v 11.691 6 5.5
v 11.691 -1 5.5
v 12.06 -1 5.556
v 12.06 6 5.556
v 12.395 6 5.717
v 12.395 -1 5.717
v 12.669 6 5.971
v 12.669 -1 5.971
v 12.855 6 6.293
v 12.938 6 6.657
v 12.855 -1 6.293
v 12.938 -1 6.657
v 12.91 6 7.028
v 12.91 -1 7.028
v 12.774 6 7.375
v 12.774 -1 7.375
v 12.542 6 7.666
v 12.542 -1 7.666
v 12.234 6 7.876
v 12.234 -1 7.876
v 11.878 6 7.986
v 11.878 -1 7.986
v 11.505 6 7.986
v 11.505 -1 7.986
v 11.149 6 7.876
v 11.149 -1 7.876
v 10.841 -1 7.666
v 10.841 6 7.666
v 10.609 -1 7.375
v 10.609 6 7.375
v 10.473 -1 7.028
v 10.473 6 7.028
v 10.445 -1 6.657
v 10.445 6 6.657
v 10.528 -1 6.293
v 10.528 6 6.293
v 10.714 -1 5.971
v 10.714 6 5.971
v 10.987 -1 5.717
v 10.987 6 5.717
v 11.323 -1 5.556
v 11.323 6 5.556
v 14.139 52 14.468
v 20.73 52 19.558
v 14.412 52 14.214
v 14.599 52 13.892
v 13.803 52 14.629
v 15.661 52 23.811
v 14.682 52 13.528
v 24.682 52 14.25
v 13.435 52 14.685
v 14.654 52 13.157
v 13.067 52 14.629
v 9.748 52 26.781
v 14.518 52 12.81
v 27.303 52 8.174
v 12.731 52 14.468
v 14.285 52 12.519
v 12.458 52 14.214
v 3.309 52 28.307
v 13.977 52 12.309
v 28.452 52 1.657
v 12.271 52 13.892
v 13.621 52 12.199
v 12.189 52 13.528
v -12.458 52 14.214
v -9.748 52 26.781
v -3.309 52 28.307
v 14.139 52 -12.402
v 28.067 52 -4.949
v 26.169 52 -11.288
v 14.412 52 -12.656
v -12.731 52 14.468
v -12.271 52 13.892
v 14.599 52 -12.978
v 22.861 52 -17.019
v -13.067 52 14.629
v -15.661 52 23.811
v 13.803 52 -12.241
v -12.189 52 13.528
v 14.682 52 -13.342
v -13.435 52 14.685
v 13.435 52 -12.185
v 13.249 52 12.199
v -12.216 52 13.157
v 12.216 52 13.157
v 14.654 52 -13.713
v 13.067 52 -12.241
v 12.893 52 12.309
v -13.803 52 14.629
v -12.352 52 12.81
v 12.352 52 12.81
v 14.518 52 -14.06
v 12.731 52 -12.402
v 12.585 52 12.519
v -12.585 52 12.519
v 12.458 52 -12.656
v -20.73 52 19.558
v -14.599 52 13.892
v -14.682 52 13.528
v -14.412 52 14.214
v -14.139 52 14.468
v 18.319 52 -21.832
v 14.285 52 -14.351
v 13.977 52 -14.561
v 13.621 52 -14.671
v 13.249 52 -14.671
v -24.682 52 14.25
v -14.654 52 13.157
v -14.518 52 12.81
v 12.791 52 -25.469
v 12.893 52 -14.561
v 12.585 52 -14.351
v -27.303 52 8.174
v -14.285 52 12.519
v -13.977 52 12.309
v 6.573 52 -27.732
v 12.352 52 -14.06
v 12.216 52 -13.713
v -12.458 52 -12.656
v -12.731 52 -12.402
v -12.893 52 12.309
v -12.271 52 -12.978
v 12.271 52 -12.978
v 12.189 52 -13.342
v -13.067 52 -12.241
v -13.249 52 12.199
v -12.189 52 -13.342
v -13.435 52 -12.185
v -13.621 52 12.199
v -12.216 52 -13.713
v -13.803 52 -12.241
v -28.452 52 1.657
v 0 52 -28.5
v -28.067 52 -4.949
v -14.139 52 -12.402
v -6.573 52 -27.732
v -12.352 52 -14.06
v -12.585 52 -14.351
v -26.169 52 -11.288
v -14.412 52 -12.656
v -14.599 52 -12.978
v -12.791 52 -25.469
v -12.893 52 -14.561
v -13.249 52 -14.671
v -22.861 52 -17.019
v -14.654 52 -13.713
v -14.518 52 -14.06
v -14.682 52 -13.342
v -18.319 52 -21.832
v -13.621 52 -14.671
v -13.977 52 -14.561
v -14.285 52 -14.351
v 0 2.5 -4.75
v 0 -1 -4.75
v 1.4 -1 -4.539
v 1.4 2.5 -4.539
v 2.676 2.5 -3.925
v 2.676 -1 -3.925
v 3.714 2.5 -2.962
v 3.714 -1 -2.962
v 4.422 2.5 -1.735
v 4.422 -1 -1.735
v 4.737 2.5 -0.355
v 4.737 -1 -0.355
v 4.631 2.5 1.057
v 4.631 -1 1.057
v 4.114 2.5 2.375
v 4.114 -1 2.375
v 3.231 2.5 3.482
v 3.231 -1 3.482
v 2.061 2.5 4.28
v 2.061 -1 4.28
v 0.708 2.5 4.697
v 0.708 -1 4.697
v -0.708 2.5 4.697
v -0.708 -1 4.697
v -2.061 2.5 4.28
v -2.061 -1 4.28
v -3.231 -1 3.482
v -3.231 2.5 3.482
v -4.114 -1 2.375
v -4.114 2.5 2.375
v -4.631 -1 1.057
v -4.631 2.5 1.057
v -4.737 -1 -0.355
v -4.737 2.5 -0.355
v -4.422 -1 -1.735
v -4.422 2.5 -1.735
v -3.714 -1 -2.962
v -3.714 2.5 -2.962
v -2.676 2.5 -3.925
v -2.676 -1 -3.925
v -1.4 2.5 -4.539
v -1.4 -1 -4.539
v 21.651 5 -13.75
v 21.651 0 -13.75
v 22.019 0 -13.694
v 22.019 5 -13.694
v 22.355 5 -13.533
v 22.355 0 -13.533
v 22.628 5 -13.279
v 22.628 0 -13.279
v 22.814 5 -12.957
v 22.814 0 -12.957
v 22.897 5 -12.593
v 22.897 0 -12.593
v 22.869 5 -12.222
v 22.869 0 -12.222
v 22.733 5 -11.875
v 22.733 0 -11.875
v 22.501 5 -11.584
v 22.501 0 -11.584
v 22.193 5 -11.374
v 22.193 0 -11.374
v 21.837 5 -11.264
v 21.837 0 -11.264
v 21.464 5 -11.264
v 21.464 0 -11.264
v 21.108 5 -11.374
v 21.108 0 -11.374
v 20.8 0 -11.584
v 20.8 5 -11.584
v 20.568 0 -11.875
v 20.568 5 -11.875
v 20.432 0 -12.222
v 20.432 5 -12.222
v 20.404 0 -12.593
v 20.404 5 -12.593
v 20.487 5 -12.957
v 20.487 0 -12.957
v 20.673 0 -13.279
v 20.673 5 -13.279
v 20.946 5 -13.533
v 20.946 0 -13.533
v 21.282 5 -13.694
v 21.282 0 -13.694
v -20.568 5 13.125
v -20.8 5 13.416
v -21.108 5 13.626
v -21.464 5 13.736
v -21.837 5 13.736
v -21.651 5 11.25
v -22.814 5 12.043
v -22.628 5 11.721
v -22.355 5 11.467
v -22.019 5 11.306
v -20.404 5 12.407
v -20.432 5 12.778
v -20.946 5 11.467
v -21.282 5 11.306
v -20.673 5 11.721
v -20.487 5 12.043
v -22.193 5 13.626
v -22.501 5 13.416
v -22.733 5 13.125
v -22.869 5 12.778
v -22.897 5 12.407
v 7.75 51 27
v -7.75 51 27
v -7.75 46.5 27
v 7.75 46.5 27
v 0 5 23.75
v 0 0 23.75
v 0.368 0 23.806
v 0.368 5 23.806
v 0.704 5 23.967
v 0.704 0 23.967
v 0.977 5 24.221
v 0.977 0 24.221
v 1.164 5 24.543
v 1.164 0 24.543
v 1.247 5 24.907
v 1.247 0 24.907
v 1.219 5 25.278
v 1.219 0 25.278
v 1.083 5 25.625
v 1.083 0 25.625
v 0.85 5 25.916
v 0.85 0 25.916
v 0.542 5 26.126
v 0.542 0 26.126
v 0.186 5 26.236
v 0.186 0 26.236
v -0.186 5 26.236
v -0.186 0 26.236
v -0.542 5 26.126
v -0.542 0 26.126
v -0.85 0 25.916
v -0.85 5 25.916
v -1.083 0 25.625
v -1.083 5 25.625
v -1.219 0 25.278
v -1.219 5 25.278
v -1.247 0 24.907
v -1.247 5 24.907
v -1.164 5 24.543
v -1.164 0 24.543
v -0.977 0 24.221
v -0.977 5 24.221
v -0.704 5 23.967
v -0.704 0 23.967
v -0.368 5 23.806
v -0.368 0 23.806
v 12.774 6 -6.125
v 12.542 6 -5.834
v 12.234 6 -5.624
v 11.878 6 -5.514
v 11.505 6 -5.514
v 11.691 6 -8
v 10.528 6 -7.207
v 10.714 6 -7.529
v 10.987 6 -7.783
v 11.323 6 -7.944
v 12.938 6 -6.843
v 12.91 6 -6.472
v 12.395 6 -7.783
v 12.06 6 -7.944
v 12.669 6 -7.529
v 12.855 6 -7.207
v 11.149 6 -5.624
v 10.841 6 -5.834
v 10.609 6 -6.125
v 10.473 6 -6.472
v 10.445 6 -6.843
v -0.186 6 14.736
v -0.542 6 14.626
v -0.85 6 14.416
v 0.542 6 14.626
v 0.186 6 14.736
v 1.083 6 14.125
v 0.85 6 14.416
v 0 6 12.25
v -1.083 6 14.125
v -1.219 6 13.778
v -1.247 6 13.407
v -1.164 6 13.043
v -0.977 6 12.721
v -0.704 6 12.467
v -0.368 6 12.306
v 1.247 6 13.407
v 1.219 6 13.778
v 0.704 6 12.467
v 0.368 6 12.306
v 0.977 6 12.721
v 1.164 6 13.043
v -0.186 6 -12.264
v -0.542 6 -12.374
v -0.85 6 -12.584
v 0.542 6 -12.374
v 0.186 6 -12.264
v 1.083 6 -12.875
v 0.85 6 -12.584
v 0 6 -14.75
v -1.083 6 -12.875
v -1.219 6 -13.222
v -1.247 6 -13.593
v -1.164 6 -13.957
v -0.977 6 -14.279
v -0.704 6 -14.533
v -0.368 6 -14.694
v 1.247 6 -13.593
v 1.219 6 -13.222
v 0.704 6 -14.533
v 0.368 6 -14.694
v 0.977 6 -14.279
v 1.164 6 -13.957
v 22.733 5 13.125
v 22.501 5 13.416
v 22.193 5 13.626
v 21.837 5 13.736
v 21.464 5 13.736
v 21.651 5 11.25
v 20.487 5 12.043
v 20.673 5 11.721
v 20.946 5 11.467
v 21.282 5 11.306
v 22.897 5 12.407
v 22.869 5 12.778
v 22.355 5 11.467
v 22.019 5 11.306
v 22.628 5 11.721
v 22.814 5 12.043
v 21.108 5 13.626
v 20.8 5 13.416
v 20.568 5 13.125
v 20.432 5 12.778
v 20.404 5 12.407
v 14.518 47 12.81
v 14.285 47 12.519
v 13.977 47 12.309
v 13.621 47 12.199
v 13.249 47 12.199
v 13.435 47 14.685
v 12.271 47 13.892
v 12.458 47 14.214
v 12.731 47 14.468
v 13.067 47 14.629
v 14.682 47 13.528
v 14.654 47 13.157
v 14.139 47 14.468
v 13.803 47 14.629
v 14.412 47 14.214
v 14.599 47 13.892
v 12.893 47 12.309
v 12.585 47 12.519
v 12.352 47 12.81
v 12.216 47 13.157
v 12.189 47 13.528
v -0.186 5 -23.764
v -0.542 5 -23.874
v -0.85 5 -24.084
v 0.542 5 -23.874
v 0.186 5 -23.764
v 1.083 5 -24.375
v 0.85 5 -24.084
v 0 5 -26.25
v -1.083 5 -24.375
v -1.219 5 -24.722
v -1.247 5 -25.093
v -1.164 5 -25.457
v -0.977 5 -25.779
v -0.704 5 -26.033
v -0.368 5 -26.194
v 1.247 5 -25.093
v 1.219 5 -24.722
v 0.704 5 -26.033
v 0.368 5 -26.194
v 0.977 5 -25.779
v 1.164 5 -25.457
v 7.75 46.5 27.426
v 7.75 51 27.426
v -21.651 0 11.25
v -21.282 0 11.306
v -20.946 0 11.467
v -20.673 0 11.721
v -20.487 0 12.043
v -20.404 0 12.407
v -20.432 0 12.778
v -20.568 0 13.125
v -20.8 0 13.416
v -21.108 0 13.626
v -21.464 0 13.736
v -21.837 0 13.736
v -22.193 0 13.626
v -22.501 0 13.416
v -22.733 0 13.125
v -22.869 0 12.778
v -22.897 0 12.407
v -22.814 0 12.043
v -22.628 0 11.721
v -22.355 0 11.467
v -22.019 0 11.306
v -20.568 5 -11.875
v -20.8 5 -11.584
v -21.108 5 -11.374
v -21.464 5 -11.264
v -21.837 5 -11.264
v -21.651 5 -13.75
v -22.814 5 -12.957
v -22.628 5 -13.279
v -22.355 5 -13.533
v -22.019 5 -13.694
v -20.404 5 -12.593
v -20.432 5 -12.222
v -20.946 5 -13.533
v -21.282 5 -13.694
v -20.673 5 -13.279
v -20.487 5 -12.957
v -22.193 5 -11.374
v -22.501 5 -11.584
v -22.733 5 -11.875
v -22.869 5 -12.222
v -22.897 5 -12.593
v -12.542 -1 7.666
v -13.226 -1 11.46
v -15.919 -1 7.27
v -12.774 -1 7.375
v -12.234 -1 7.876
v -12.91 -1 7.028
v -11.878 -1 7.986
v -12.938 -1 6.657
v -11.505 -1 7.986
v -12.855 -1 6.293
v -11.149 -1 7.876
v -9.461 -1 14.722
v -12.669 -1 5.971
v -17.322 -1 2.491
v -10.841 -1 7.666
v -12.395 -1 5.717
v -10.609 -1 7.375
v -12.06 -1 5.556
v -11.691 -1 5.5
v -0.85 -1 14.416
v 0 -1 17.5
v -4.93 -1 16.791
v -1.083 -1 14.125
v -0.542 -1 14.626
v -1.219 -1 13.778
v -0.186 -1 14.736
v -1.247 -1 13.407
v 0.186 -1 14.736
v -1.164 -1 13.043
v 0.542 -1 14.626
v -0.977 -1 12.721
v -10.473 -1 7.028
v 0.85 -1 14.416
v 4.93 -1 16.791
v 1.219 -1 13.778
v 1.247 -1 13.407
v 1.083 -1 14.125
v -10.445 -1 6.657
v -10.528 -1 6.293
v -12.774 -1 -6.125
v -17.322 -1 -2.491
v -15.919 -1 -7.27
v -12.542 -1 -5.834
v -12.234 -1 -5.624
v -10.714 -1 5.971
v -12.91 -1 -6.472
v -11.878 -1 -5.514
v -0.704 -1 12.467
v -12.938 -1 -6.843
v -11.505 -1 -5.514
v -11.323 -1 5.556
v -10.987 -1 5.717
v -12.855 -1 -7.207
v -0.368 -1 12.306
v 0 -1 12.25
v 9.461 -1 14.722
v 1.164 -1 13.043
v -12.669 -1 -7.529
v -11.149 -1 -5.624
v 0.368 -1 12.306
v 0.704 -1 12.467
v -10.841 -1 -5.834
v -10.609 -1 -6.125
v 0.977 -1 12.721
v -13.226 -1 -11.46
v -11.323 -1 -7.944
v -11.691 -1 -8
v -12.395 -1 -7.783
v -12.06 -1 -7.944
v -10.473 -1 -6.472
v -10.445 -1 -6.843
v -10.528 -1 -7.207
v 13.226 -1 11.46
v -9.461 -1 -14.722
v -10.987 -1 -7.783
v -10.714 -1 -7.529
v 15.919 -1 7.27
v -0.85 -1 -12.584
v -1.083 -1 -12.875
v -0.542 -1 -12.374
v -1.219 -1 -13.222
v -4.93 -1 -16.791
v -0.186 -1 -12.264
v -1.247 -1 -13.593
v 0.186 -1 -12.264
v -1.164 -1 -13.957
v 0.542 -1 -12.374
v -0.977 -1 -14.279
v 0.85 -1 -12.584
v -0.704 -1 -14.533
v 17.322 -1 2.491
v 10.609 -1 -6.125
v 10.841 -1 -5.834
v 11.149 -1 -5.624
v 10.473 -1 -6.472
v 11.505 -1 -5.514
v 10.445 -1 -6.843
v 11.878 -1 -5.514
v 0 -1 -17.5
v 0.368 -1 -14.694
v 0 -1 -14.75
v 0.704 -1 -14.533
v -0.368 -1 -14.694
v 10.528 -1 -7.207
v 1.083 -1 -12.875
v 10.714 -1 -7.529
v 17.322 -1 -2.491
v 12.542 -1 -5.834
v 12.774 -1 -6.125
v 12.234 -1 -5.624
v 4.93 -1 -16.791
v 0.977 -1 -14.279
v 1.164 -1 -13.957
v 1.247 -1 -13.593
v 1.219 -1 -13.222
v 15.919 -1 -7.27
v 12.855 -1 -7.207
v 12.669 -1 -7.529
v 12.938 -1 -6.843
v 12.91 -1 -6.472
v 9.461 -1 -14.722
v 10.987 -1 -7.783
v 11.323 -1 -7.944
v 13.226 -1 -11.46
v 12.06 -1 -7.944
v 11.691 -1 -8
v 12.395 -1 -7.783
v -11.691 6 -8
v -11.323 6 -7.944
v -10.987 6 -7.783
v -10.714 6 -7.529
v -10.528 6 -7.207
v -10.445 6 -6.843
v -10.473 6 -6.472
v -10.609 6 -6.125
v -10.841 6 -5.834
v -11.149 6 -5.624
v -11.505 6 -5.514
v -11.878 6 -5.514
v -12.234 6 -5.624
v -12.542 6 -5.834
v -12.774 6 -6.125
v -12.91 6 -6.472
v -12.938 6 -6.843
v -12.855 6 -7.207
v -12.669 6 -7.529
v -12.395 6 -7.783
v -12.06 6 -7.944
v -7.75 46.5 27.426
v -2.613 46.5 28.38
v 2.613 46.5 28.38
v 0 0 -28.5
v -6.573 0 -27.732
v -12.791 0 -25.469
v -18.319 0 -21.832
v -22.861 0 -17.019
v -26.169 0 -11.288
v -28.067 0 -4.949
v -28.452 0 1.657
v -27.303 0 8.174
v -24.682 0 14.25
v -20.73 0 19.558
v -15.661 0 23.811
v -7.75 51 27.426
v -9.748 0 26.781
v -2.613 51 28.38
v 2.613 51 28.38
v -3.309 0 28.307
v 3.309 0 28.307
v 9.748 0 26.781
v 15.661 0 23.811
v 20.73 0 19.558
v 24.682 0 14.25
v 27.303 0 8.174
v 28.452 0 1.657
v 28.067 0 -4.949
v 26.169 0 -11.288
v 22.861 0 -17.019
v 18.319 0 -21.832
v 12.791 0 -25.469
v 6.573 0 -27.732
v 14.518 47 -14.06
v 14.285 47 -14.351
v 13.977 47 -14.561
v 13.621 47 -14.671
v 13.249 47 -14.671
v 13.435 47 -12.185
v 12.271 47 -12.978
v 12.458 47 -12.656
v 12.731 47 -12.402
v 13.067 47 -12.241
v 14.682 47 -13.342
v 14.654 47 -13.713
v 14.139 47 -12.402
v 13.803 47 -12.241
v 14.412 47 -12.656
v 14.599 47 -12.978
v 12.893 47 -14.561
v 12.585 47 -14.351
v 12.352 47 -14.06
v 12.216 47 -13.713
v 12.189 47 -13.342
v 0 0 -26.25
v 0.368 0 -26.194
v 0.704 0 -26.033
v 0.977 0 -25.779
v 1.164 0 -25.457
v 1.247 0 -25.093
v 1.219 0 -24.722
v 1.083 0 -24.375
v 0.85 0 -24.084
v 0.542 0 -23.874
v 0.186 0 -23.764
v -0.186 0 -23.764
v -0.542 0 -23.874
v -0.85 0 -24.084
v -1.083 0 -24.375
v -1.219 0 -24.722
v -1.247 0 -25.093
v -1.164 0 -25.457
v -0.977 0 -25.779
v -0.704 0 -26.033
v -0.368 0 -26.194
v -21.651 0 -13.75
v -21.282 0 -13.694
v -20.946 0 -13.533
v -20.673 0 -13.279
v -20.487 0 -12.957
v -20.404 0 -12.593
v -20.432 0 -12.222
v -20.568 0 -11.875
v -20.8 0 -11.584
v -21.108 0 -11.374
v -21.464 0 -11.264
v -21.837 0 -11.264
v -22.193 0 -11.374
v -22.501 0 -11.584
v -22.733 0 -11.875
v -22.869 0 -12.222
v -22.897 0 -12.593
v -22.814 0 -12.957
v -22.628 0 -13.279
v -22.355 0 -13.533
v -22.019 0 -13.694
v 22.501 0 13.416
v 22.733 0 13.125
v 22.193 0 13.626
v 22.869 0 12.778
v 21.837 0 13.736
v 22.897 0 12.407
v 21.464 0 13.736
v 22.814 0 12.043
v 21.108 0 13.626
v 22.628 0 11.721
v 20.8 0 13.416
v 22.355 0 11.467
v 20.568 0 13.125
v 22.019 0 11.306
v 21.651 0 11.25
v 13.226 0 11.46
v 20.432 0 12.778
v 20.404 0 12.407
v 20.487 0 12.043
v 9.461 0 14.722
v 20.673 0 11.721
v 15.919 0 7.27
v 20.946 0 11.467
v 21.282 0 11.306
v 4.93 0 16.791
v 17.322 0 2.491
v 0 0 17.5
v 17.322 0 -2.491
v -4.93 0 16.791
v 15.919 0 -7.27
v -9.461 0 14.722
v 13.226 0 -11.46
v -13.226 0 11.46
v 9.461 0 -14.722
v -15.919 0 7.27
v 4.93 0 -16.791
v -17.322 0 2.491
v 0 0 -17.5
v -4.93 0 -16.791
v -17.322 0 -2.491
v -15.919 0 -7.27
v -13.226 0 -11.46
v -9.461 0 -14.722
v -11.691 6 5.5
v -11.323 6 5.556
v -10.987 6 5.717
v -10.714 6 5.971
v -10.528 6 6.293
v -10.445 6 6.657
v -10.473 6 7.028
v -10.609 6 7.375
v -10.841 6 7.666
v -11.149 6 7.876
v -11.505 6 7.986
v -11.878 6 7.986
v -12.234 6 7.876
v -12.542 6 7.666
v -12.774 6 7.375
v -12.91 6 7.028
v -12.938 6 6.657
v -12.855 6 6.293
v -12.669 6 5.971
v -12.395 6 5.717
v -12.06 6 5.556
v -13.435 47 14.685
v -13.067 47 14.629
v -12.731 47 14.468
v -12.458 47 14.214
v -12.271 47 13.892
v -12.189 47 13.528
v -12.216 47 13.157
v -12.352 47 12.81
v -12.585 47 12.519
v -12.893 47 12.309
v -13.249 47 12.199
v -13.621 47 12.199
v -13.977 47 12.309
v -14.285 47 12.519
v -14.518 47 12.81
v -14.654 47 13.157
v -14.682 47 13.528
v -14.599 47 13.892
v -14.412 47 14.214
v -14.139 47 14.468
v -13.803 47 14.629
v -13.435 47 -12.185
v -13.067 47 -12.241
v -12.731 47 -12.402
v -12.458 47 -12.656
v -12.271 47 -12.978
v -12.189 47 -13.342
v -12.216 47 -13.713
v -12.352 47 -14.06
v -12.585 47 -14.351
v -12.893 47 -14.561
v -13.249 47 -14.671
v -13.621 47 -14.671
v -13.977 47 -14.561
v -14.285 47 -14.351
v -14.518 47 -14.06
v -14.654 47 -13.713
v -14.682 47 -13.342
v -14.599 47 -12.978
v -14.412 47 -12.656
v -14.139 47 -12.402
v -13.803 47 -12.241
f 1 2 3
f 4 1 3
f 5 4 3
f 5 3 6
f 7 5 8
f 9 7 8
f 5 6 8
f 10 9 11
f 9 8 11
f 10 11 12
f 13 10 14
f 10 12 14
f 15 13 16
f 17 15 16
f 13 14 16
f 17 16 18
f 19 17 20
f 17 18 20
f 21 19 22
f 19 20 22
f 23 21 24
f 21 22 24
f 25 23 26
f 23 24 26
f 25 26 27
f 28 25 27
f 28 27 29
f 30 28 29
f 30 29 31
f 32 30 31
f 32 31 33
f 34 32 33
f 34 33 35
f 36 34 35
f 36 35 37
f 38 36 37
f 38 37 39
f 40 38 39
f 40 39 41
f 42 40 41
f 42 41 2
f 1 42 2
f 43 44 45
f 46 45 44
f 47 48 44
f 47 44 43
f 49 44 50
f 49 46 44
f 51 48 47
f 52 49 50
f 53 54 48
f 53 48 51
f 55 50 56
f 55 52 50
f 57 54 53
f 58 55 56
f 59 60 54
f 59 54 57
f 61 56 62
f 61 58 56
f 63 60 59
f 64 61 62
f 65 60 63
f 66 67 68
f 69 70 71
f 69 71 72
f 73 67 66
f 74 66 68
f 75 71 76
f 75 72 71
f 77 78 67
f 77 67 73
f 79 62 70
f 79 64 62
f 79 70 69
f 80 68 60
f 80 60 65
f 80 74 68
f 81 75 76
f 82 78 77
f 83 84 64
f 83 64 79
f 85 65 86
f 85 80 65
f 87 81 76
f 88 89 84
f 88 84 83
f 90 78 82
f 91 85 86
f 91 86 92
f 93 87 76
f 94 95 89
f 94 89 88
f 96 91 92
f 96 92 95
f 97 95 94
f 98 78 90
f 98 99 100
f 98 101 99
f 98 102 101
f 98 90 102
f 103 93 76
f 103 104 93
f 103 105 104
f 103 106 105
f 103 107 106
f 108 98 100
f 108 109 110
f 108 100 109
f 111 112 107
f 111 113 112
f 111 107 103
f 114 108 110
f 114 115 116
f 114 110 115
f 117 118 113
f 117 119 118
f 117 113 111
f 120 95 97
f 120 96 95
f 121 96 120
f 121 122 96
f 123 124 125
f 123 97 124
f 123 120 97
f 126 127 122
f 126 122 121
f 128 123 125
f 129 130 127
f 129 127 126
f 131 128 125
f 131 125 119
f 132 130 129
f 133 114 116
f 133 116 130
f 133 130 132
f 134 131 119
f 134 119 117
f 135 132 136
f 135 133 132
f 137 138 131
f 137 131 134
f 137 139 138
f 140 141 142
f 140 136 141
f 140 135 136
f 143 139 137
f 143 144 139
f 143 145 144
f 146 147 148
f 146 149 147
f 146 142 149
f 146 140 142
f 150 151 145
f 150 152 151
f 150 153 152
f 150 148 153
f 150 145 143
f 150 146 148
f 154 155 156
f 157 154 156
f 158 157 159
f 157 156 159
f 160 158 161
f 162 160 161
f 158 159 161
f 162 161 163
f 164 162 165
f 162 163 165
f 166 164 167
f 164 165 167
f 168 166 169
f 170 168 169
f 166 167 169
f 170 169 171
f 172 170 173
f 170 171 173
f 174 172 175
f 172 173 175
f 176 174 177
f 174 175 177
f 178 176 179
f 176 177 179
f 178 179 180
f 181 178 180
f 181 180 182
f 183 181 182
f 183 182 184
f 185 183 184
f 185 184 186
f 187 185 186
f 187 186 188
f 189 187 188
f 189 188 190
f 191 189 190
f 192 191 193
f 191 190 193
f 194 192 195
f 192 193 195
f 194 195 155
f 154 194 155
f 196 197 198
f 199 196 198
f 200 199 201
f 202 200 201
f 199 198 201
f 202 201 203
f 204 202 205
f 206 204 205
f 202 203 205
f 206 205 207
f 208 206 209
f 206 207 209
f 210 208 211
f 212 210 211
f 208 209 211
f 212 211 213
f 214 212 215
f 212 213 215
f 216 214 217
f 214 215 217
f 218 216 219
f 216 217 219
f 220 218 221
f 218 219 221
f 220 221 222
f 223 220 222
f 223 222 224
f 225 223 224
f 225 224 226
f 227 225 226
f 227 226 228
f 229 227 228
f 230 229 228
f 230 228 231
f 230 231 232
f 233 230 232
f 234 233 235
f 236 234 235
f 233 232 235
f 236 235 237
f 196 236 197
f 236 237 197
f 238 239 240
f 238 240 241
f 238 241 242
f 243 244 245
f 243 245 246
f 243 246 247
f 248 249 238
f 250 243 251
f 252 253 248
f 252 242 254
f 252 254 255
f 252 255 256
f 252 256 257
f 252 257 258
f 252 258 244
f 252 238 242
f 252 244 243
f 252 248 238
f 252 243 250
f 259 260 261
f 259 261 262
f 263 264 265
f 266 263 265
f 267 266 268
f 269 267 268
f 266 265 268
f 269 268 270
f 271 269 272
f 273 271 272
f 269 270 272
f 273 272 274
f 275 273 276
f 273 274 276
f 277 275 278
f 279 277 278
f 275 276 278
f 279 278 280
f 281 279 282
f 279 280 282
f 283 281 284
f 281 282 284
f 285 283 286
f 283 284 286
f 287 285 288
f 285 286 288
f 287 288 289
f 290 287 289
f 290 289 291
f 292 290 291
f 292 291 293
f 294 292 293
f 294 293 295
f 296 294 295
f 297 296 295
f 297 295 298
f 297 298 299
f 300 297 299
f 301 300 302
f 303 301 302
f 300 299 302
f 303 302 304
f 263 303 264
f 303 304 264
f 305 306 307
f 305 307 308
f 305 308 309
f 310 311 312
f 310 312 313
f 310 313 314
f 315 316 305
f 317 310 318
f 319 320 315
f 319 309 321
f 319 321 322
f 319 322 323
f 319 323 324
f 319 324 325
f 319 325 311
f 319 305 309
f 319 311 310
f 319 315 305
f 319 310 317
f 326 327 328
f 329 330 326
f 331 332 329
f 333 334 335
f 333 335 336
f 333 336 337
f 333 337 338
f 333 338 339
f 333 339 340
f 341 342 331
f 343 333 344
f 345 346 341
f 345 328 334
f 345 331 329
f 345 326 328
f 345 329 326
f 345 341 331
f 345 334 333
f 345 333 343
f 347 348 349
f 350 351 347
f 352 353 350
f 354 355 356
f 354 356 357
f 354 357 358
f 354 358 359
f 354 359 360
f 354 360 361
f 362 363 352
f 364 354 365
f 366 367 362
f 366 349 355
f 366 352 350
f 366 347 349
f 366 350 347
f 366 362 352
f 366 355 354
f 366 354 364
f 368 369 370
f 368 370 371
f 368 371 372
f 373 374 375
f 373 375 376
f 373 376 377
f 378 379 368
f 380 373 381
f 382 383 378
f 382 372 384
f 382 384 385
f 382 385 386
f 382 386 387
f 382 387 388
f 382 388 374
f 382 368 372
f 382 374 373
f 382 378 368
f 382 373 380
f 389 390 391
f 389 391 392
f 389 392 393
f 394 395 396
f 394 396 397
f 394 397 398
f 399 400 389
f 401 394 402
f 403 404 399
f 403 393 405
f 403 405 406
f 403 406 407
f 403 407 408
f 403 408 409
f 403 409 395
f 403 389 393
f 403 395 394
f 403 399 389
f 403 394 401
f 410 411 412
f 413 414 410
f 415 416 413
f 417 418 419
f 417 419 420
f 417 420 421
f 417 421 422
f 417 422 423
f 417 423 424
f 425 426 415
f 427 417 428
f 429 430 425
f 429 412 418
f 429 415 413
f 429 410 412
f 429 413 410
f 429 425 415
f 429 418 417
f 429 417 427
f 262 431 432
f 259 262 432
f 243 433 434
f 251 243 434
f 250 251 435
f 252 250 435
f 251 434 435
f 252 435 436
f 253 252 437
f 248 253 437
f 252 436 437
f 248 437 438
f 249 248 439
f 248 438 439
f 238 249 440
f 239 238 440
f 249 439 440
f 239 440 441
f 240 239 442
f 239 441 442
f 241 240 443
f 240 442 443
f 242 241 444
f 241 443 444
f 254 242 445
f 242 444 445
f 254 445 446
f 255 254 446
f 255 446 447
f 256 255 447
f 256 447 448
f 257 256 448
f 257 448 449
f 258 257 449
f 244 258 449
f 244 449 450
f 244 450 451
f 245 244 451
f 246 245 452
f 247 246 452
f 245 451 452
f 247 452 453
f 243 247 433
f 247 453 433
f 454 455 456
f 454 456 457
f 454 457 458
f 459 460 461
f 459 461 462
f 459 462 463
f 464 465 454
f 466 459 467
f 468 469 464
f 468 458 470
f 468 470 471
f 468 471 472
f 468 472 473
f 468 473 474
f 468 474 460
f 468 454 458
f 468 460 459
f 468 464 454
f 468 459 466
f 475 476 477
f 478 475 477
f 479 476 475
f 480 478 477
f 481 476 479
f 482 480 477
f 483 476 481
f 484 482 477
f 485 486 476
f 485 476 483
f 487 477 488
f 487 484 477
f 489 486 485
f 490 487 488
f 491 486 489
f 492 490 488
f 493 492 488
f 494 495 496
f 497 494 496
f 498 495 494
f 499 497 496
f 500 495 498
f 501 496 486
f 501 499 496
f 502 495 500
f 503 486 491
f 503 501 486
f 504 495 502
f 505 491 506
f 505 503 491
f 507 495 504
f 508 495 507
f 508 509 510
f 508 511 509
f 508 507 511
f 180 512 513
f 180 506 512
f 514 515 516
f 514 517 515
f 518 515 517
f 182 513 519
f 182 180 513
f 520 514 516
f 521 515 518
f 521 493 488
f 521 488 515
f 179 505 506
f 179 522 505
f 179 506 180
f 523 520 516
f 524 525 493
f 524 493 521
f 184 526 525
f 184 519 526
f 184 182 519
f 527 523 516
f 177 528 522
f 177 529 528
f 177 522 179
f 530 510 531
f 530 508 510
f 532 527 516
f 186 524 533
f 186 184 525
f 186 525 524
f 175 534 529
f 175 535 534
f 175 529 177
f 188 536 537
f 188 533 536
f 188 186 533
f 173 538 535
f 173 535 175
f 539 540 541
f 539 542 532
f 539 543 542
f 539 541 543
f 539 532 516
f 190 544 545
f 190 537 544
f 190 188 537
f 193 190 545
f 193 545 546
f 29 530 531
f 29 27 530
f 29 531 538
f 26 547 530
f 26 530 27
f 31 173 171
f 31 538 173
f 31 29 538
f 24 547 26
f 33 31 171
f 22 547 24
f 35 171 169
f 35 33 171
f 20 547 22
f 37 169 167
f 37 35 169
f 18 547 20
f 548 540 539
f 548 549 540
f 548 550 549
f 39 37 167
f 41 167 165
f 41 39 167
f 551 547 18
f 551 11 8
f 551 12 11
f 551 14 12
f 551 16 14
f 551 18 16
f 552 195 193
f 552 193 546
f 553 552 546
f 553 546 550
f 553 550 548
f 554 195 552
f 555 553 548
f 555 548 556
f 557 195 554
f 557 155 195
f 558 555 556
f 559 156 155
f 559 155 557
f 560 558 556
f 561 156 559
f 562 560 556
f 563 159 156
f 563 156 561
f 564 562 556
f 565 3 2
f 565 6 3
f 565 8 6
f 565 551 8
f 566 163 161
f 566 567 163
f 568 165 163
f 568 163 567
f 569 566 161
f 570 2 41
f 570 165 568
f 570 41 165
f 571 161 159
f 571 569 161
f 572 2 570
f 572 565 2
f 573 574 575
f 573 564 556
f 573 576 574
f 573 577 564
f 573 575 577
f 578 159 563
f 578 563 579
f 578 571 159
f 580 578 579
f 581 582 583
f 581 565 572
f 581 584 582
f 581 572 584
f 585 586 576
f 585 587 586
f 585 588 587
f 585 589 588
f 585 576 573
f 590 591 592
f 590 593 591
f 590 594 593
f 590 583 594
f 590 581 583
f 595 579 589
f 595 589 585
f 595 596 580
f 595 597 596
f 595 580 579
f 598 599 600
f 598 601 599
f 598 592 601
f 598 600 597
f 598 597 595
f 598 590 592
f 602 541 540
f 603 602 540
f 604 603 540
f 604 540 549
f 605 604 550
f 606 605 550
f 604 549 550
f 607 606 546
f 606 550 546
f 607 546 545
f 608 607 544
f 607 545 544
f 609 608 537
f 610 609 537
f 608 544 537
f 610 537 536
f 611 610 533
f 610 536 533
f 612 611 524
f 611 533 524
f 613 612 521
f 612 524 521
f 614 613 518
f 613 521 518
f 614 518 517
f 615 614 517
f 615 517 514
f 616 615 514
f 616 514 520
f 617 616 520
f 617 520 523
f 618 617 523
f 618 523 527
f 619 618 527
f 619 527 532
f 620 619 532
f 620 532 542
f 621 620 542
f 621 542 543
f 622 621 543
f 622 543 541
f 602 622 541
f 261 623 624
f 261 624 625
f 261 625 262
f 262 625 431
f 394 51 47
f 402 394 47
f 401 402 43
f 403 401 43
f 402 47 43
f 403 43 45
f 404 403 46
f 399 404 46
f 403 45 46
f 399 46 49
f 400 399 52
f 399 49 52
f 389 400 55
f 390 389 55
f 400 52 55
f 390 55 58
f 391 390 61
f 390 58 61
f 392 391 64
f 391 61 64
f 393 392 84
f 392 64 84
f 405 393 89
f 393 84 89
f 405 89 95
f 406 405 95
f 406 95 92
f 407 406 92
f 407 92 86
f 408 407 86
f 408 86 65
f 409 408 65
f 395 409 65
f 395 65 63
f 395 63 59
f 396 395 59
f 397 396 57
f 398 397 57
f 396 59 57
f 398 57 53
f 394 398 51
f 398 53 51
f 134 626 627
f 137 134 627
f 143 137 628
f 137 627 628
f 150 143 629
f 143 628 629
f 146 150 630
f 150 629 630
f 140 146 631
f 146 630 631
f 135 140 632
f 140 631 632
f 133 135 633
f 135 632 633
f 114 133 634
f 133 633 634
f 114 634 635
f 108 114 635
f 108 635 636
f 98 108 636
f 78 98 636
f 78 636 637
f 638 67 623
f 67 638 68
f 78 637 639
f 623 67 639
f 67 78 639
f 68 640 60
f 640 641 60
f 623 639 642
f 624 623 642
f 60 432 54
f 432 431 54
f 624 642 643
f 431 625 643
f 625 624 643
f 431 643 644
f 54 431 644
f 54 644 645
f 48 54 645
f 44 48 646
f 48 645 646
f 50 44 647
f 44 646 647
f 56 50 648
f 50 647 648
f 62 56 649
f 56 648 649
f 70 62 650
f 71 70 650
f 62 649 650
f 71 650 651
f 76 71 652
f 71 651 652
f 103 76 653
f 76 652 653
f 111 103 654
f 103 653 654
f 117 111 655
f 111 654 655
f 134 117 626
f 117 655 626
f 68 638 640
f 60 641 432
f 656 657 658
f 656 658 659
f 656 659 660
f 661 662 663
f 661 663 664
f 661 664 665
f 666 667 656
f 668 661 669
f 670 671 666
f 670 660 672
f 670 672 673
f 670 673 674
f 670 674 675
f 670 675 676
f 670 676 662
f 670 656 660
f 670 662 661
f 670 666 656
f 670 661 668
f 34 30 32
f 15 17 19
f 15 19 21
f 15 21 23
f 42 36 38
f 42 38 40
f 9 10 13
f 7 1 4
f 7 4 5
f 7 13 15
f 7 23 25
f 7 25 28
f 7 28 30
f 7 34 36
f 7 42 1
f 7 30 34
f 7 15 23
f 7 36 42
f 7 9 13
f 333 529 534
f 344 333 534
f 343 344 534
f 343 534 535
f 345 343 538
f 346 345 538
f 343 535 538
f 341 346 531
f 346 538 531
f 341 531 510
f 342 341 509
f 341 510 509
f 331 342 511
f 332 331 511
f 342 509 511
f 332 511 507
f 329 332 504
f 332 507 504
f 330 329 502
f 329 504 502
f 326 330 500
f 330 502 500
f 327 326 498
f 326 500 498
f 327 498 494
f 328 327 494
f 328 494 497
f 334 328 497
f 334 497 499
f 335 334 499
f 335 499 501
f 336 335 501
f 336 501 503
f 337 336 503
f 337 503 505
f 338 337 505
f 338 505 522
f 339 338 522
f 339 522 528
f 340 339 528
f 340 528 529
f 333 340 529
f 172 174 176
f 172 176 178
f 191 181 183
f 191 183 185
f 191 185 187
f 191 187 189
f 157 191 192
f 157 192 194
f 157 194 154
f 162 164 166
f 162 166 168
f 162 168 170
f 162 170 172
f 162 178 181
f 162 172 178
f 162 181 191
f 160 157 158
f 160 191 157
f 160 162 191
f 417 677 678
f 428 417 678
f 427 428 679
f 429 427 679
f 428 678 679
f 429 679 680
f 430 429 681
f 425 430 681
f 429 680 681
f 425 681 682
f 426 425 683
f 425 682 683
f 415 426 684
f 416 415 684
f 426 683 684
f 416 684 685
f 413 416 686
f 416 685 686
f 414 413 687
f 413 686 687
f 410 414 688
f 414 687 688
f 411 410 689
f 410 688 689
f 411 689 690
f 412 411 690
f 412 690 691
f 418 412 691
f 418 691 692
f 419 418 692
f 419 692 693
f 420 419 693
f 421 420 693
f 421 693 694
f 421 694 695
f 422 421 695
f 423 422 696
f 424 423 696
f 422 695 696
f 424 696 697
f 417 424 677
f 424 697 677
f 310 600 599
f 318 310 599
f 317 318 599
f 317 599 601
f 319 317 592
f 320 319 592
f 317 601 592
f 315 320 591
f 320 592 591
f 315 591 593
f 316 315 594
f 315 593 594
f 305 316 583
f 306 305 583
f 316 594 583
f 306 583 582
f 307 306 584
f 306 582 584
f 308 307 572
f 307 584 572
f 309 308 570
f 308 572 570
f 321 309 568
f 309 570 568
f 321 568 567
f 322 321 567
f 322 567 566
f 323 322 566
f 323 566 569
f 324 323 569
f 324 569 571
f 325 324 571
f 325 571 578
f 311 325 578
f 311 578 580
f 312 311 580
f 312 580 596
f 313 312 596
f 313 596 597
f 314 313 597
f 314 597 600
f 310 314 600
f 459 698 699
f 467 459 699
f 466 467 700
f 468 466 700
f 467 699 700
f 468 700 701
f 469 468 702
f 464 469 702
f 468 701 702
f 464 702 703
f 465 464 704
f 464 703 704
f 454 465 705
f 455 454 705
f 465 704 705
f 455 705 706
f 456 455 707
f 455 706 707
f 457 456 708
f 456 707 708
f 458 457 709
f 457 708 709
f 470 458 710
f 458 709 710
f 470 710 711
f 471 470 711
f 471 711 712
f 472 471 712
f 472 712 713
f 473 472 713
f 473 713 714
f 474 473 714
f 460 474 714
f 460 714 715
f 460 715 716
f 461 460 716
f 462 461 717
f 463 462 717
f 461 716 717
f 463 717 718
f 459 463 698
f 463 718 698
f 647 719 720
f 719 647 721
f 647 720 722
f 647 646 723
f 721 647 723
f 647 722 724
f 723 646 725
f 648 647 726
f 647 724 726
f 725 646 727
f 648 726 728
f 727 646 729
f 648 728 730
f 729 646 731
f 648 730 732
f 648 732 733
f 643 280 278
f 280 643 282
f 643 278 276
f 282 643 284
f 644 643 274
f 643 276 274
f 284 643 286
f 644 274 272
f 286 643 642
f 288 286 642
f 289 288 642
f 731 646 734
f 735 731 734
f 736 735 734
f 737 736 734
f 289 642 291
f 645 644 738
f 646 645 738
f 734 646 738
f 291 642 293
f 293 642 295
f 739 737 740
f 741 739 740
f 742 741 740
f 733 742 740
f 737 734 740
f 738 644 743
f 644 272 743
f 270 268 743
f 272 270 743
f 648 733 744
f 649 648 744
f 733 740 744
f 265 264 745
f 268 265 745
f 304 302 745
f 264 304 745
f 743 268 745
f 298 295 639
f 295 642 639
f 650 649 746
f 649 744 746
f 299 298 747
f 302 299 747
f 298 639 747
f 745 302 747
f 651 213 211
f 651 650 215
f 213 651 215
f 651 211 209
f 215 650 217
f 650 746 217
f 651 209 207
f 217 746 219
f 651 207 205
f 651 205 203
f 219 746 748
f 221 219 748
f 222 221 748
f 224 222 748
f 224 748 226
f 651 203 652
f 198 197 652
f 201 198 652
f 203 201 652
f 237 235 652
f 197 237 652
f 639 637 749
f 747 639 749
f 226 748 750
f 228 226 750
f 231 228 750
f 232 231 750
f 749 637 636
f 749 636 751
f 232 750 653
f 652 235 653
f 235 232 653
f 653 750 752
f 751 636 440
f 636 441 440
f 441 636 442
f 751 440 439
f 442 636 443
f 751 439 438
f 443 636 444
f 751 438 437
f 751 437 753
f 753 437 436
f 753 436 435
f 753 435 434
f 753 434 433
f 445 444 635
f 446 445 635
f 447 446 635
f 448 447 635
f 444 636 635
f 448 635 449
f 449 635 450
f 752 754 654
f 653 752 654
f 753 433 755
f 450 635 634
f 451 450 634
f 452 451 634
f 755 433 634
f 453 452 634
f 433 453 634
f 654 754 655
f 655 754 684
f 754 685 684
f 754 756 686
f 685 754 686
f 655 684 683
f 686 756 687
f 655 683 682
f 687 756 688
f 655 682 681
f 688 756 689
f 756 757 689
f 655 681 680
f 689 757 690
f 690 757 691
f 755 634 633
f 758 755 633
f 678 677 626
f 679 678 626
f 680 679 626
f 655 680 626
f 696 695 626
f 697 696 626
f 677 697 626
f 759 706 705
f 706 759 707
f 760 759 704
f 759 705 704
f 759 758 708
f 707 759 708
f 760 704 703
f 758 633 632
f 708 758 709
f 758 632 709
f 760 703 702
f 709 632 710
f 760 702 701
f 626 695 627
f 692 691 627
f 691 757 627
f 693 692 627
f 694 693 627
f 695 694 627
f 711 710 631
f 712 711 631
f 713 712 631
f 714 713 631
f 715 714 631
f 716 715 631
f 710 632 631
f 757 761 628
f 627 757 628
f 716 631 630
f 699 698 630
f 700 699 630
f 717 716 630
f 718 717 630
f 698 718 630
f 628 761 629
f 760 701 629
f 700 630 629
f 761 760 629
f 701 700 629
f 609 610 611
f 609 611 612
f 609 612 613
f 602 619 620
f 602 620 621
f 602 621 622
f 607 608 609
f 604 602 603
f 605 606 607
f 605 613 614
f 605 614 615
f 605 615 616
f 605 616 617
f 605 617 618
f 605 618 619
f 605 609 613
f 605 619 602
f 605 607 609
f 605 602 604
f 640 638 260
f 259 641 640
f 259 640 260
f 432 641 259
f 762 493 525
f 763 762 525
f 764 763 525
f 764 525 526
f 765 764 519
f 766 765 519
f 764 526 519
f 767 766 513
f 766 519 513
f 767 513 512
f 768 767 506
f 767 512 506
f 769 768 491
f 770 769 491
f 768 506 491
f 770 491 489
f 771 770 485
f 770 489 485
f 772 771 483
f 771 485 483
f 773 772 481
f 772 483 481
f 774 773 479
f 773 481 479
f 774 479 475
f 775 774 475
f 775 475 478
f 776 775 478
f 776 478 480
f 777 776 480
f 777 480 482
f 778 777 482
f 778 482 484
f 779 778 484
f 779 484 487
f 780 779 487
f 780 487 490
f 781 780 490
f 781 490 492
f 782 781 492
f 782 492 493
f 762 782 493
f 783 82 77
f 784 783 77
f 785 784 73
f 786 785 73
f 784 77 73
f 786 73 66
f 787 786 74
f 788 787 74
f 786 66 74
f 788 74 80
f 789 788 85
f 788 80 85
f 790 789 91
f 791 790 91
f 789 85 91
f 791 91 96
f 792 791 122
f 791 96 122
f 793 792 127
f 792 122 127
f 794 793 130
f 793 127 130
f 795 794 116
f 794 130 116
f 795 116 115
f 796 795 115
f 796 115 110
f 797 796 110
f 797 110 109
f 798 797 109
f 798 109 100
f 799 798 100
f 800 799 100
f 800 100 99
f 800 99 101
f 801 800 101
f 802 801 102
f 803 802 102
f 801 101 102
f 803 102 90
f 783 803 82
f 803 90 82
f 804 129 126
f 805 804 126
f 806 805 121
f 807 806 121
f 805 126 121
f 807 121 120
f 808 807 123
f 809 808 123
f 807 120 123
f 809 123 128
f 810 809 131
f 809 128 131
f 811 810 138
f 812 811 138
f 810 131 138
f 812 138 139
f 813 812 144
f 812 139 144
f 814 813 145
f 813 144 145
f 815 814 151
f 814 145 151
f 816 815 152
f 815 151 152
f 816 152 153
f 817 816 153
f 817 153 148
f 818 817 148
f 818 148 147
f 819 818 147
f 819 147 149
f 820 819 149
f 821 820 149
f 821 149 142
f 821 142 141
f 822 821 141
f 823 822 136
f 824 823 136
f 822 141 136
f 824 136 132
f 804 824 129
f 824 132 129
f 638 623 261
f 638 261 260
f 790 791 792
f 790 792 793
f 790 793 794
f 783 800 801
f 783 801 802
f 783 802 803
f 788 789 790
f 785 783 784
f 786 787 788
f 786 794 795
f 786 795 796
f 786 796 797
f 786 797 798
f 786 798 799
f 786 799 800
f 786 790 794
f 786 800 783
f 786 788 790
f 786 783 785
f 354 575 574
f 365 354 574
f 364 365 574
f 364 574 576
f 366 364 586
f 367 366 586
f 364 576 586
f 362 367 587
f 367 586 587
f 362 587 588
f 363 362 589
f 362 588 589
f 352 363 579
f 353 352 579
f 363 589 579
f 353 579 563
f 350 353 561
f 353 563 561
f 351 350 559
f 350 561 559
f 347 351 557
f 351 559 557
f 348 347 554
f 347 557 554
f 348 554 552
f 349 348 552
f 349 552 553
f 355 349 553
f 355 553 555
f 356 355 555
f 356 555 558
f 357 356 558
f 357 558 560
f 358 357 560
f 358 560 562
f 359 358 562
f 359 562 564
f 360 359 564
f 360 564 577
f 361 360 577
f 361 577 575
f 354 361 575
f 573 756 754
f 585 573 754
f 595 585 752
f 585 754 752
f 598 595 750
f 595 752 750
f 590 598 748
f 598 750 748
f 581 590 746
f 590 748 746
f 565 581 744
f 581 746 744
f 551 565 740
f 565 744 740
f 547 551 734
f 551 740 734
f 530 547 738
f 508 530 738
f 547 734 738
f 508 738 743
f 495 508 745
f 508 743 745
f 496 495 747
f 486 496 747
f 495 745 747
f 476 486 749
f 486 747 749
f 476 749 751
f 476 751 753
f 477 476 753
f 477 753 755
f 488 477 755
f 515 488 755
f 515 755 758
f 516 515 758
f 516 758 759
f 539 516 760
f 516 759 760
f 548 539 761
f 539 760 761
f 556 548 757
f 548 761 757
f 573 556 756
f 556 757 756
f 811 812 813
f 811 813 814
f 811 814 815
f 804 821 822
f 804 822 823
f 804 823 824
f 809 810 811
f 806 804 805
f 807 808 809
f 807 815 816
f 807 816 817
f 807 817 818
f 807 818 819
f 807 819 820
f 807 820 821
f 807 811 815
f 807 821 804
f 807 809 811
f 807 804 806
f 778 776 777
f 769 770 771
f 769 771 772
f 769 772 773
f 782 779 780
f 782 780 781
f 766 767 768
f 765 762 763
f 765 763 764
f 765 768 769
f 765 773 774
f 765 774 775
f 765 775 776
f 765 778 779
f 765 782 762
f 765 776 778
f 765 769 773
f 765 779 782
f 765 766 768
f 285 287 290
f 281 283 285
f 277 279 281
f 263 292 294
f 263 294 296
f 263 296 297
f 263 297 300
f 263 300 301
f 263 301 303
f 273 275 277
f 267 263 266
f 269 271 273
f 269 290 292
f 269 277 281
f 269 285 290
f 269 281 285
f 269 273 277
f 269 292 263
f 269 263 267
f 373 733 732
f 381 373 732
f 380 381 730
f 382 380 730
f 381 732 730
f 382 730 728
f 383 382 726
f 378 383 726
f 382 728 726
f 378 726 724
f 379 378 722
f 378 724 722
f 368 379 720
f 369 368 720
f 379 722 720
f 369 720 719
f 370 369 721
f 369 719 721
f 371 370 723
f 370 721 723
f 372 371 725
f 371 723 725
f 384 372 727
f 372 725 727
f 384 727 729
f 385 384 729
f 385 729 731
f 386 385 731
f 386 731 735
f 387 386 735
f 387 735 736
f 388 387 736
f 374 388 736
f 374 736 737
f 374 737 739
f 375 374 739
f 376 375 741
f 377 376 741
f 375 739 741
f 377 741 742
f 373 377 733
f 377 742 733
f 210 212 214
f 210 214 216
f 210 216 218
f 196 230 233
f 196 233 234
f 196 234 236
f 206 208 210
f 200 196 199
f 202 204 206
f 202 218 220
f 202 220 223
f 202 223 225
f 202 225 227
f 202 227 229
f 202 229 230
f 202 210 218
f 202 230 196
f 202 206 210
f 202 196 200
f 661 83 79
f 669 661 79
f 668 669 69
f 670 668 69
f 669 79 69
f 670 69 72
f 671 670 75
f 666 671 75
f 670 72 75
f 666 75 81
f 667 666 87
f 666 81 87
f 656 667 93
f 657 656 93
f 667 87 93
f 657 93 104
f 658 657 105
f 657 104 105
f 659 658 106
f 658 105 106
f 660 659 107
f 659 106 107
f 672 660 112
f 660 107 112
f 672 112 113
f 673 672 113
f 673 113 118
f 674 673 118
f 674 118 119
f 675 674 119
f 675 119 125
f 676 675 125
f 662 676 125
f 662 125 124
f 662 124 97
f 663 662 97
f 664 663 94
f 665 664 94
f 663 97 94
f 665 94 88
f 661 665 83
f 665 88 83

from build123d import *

# Parameters (mm, degrees)
SKETCH_1_R          = 28.5
EXTRUDE_1_DEPTH     = 52
SKETCH_2_R          = 17.5
EXTRUDE_2_DEPTH     = 1
SKETCH_3_R          = 1.25
SKETCH_3_R_2        = 4.75
CUT_EXTRUDE_1_DEPTH = 3.5
MOVE_FACE_1_BY      = 3.5
MOVE_FACE_1_2_BY    = 3.5
MOVE_FACE_1_3_BY    = 3.5
MOVE_FACE_1_4_BY    = 3.5
MOVE_FACE_1_5_BY    = 3.5
MOVE_FACE_1_6_BY    = 3.5
SKETCH_4_R          = 1.25
CUT_EXTRUDE_2_DEPTH = 5
SKETCH_5_W          = 15.5
SKETCH_5_H          = 4.5
CUT_EXTRUDE_3_DEPTH = 1.5
SKETCH_6_R          = 1.25
CUT_EXTRUDE_4_DEPTH = 5


with BuildPart() as part:
    # 草图1 → 凸台-拉伸1 (new body)
    with BuildSketch(Plane(origin=(0, 0, 0), x_dir=(1, 0, 0), z_dir=(0, 1, 0))):
        Circle(SKETCH_1_R)
    extrude(amount=EXTRUDE_1_DEPTH)

    # 草图2 → 凸台-拉伸2 (add)
    with BuildSketch(Plane.XZ):
        Circle(SKETCH_2_R)
    extrude(amount=EXTRUDE_2_DEPTH)

    # 草图3 → 切除-拉伸1 (cut)
    with BuildSketch(Plane.XZ.offset(1)):
        with Locations((0, 13.5)):
            Circle(SKETCH_3_R)
        with Locations((11.691342951, 6.75)):
            Circle(SKETCH_3_R)
        with Locations((11.691342951, -6.75)):
            Circle(SKETCH_3_R)
        with Locations((0, -13.5)):
            Circle(SKETCH_3_R)
        with Locations((-11.691342951, -6.75)):
            Circle(SKETCH_3_R)
        with Locations((-11.691342951, 6.75)):
            Circle(SKETCH_3_R)
        Circle(SKETCH_3_R_2)
    extrude(amount=-CUT_EXTRUDE_1_DEPTH, mode=Mode.SUBTRACT)

    # Move Face 1: a face moved inward by 3.5
    extrude(part.faces().sort_by_distance((11.691342951, 2.5, -6.75))[0], amount=MOVE_FACE_1_BY, dir=(0, 1, 0), mode=Mode.SUBTRACT)

    # Move Face 1 2: a face moved inward by 3.5
    extrude(part.faces().sort_by_distance((0, 2.5, -13.5))[0], amount=MOVE_FACE_1_2_BY, dir=(0, 1, 0), mode=Mode.SUBTRACT)

    # Move Face 1 3: a face moved inward by 3.5
    extrude(part.faces().sort_by_distance((-11.691342951, 2.5, -6.75))[0], amount=MOVE_FACE_1_3_BY, dir=(0, 1, 0), mode=Mode.SUBTRACT)

    # Move Face 1 4: a face moved inward by 3.5
    extrude(part.faces().sort_by_distance((-11.691342951, 2.5, 6.75))[0], amount=MOVE_FACE_1_4_BY, dir=(0, 1, 0), mode=Mode.SUBTRACT)

    # Move Face 1 5: a face moved inward by 3.5
    extrude(part.faces().sort_by_distance((0, 2.5, 13.5))[0], amount=MOVE_FACE_1_5_BY, dir=(0, 1, 0), mode=Mode.SUBTRACT)

    # Move Face 1 6: a face moved inward by 3.5
    extrude(part.faces().sort_by_distance((11.691342951, 2.5, 6.75))[0], amount=MOVE_FACE_1_6_BY, dir=(0, 1, 0), mode=Mode.SUBTRACT)

    # 草图4 → 切除-拉伸2 (cut)
    with BuildSketch(Plane.XZ):
        with Locations((0, 25)):
            Circle(SKETCH_4_R)
        with Locations((21.650635095, 12.5)):
            Circle(SKETCH_4_R)
        with Locations((21.650635095, -12.5)):
            Circle(SKETCH_4_R)
        with Locations((0, -25)):
            Circle(SKETCH_4_R)
        with Locations((-21.650635095, -12.5)):
            Circle(SKETCH_4_R)
        with Locations((-21.650635095, 12.5)):
            Circle(SKETCH_4_R)
    extrude(amount=-CUT_EXTRUDE_2_DEPTH, mode=Mode.SUBTRACT)

    # 草图5 → 切除-拉伸3 (cut)
    with BuildSketch(Plane.XY.offset(28.5)):
        with Locations((0, 48.75)):
            Rectangle(SKETCH_5_W, SKETCH_5_H)
    extrude(amount=-CUT_EXTRUDE_3_DEPTH, mode=Mode.SUBTRACT)

    # 草图6 → 切除-拉伸4 (cut)
    with BuildSketch(Plane(origin=(0, 52, 0), x_dir=(1, 0, 0), z_dir=(0, 1, 0))):
        with Locations((13.435028843, 13.435028843)):
            Circle(SKETCH_6_R)
        with Locations((13.435028843, -13.435028843)):
            Circle(SKETCH_6_R)
        with Locations((-13.435028843, -13.435028843)):
            Circle(SKETCH_6_R)
        with Locations((-13.435028843, 13.435028843)):
            Circle(SKETCH_6_R)
    extrude(amount=-CUT_EXTRUDE_4_DEPTH, mode=Mode.SUBTRACT)


solid = part.part
